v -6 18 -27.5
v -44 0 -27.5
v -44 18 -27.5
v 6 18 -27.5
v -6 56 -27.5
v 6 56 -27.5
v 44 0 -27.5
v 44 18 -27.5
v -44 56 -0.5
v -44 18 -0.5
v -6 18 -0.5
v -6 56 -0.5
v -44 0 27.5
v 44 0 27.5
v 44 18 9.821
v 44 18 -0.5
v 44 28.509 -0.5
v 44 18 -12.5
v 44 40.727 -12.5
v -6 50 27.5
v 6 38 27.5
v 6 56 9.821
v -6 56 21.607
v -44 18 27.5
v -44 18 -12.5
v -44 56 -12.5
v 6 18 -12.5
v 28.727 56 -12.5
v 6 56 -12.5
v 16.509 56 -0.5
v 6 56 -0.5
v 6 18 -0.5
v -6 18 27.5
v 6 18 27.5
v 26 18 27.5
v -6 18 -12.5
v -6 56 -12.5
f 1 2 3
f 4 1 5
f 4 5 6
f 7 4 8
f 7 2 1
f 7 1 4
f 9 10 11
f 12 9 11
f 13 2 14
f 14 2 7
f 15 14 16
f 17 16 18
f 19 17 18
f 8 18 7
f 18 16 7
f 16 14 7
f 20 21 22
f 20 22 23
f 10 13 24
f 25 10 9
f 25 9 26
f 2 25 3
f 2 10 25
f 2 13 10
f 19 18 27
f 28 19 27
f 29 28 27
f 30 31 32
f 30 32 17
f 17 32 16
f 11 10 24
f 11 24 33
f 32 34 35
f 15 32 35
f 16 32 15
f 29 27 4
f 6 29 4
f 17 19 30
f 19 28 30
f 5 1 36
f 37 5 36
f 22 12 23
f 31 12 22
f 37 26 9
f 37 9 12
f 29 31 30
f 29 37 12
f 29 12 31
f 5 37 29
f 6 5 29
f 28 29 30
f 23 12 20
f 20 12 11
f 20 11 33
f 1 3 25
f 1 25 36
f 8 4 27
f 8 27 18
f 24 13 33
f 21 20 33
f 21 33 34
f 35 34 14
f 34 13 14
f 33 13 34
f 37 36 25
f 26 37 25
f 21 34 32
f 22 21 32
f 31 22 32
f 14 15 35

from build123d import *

# Parameters (mm, degrees)
SKETCH1_W           = 88
SKETCH1_H           = 55
BOSS_EXTRUDE1_DEPTH = 18
BOSS_EXTRUDE2_DEPTH = 38
CUT_EXTRUDE4_DEPTH  = 38


with BuildPart() as part:
    # Sketch1 → Boss-Extrude1 (new body)
    with BuildSketch(Plane(origin=(0, 0, 0), x_dir=(1, 0, 0), z_dir=(0, 1, 0))):
        Rectangle(SKETCH1_W, SKETCH1_H)
    extrude(amount=BOSS_EXTRUDE1_DEPTH)

    # Sketch2 → Boss-Extrude2 (add)
    with BuildSketch(Plane(origin=(0, 18, 0), x_dir=(1, 0, 0), z_dir=(0, 1, 0))):
        Polygon((-6, 27.5), (-6, 12.5), (-44, 12.5), (-44, 0.5), (-6, 0.5), (-6, -27.5), (6, -27.5), (6, 0.5), (44, 0.5), (44, 12.5), (6, 12.5), (6, 27.5), align=None)
    extrude(amount=BOSS_EXTRUDE2_DEPTH)

    # Sketch6 → Cut-Extrude4 (cut)
    with BuildSketch(Plane(origin=(23.709993468, 23.709993468, 24.141084259), x_dir=(-0.8189594221707254, 0.4021022970404831, 0.4094132478957647), z_dir=(-0.5738514309799984, -0.5738514309800047, -0.5842850933614594))):
        Polygon((-24.775350258, -19.269470409), (43.604106017, 20.683626585), (-24.775350258, 59.222567403), align=None)
    extrude(amount=-CUT_EXTRUDE4_DEPTH, mode=Mode.SUBTRACT)


solid = part.part
